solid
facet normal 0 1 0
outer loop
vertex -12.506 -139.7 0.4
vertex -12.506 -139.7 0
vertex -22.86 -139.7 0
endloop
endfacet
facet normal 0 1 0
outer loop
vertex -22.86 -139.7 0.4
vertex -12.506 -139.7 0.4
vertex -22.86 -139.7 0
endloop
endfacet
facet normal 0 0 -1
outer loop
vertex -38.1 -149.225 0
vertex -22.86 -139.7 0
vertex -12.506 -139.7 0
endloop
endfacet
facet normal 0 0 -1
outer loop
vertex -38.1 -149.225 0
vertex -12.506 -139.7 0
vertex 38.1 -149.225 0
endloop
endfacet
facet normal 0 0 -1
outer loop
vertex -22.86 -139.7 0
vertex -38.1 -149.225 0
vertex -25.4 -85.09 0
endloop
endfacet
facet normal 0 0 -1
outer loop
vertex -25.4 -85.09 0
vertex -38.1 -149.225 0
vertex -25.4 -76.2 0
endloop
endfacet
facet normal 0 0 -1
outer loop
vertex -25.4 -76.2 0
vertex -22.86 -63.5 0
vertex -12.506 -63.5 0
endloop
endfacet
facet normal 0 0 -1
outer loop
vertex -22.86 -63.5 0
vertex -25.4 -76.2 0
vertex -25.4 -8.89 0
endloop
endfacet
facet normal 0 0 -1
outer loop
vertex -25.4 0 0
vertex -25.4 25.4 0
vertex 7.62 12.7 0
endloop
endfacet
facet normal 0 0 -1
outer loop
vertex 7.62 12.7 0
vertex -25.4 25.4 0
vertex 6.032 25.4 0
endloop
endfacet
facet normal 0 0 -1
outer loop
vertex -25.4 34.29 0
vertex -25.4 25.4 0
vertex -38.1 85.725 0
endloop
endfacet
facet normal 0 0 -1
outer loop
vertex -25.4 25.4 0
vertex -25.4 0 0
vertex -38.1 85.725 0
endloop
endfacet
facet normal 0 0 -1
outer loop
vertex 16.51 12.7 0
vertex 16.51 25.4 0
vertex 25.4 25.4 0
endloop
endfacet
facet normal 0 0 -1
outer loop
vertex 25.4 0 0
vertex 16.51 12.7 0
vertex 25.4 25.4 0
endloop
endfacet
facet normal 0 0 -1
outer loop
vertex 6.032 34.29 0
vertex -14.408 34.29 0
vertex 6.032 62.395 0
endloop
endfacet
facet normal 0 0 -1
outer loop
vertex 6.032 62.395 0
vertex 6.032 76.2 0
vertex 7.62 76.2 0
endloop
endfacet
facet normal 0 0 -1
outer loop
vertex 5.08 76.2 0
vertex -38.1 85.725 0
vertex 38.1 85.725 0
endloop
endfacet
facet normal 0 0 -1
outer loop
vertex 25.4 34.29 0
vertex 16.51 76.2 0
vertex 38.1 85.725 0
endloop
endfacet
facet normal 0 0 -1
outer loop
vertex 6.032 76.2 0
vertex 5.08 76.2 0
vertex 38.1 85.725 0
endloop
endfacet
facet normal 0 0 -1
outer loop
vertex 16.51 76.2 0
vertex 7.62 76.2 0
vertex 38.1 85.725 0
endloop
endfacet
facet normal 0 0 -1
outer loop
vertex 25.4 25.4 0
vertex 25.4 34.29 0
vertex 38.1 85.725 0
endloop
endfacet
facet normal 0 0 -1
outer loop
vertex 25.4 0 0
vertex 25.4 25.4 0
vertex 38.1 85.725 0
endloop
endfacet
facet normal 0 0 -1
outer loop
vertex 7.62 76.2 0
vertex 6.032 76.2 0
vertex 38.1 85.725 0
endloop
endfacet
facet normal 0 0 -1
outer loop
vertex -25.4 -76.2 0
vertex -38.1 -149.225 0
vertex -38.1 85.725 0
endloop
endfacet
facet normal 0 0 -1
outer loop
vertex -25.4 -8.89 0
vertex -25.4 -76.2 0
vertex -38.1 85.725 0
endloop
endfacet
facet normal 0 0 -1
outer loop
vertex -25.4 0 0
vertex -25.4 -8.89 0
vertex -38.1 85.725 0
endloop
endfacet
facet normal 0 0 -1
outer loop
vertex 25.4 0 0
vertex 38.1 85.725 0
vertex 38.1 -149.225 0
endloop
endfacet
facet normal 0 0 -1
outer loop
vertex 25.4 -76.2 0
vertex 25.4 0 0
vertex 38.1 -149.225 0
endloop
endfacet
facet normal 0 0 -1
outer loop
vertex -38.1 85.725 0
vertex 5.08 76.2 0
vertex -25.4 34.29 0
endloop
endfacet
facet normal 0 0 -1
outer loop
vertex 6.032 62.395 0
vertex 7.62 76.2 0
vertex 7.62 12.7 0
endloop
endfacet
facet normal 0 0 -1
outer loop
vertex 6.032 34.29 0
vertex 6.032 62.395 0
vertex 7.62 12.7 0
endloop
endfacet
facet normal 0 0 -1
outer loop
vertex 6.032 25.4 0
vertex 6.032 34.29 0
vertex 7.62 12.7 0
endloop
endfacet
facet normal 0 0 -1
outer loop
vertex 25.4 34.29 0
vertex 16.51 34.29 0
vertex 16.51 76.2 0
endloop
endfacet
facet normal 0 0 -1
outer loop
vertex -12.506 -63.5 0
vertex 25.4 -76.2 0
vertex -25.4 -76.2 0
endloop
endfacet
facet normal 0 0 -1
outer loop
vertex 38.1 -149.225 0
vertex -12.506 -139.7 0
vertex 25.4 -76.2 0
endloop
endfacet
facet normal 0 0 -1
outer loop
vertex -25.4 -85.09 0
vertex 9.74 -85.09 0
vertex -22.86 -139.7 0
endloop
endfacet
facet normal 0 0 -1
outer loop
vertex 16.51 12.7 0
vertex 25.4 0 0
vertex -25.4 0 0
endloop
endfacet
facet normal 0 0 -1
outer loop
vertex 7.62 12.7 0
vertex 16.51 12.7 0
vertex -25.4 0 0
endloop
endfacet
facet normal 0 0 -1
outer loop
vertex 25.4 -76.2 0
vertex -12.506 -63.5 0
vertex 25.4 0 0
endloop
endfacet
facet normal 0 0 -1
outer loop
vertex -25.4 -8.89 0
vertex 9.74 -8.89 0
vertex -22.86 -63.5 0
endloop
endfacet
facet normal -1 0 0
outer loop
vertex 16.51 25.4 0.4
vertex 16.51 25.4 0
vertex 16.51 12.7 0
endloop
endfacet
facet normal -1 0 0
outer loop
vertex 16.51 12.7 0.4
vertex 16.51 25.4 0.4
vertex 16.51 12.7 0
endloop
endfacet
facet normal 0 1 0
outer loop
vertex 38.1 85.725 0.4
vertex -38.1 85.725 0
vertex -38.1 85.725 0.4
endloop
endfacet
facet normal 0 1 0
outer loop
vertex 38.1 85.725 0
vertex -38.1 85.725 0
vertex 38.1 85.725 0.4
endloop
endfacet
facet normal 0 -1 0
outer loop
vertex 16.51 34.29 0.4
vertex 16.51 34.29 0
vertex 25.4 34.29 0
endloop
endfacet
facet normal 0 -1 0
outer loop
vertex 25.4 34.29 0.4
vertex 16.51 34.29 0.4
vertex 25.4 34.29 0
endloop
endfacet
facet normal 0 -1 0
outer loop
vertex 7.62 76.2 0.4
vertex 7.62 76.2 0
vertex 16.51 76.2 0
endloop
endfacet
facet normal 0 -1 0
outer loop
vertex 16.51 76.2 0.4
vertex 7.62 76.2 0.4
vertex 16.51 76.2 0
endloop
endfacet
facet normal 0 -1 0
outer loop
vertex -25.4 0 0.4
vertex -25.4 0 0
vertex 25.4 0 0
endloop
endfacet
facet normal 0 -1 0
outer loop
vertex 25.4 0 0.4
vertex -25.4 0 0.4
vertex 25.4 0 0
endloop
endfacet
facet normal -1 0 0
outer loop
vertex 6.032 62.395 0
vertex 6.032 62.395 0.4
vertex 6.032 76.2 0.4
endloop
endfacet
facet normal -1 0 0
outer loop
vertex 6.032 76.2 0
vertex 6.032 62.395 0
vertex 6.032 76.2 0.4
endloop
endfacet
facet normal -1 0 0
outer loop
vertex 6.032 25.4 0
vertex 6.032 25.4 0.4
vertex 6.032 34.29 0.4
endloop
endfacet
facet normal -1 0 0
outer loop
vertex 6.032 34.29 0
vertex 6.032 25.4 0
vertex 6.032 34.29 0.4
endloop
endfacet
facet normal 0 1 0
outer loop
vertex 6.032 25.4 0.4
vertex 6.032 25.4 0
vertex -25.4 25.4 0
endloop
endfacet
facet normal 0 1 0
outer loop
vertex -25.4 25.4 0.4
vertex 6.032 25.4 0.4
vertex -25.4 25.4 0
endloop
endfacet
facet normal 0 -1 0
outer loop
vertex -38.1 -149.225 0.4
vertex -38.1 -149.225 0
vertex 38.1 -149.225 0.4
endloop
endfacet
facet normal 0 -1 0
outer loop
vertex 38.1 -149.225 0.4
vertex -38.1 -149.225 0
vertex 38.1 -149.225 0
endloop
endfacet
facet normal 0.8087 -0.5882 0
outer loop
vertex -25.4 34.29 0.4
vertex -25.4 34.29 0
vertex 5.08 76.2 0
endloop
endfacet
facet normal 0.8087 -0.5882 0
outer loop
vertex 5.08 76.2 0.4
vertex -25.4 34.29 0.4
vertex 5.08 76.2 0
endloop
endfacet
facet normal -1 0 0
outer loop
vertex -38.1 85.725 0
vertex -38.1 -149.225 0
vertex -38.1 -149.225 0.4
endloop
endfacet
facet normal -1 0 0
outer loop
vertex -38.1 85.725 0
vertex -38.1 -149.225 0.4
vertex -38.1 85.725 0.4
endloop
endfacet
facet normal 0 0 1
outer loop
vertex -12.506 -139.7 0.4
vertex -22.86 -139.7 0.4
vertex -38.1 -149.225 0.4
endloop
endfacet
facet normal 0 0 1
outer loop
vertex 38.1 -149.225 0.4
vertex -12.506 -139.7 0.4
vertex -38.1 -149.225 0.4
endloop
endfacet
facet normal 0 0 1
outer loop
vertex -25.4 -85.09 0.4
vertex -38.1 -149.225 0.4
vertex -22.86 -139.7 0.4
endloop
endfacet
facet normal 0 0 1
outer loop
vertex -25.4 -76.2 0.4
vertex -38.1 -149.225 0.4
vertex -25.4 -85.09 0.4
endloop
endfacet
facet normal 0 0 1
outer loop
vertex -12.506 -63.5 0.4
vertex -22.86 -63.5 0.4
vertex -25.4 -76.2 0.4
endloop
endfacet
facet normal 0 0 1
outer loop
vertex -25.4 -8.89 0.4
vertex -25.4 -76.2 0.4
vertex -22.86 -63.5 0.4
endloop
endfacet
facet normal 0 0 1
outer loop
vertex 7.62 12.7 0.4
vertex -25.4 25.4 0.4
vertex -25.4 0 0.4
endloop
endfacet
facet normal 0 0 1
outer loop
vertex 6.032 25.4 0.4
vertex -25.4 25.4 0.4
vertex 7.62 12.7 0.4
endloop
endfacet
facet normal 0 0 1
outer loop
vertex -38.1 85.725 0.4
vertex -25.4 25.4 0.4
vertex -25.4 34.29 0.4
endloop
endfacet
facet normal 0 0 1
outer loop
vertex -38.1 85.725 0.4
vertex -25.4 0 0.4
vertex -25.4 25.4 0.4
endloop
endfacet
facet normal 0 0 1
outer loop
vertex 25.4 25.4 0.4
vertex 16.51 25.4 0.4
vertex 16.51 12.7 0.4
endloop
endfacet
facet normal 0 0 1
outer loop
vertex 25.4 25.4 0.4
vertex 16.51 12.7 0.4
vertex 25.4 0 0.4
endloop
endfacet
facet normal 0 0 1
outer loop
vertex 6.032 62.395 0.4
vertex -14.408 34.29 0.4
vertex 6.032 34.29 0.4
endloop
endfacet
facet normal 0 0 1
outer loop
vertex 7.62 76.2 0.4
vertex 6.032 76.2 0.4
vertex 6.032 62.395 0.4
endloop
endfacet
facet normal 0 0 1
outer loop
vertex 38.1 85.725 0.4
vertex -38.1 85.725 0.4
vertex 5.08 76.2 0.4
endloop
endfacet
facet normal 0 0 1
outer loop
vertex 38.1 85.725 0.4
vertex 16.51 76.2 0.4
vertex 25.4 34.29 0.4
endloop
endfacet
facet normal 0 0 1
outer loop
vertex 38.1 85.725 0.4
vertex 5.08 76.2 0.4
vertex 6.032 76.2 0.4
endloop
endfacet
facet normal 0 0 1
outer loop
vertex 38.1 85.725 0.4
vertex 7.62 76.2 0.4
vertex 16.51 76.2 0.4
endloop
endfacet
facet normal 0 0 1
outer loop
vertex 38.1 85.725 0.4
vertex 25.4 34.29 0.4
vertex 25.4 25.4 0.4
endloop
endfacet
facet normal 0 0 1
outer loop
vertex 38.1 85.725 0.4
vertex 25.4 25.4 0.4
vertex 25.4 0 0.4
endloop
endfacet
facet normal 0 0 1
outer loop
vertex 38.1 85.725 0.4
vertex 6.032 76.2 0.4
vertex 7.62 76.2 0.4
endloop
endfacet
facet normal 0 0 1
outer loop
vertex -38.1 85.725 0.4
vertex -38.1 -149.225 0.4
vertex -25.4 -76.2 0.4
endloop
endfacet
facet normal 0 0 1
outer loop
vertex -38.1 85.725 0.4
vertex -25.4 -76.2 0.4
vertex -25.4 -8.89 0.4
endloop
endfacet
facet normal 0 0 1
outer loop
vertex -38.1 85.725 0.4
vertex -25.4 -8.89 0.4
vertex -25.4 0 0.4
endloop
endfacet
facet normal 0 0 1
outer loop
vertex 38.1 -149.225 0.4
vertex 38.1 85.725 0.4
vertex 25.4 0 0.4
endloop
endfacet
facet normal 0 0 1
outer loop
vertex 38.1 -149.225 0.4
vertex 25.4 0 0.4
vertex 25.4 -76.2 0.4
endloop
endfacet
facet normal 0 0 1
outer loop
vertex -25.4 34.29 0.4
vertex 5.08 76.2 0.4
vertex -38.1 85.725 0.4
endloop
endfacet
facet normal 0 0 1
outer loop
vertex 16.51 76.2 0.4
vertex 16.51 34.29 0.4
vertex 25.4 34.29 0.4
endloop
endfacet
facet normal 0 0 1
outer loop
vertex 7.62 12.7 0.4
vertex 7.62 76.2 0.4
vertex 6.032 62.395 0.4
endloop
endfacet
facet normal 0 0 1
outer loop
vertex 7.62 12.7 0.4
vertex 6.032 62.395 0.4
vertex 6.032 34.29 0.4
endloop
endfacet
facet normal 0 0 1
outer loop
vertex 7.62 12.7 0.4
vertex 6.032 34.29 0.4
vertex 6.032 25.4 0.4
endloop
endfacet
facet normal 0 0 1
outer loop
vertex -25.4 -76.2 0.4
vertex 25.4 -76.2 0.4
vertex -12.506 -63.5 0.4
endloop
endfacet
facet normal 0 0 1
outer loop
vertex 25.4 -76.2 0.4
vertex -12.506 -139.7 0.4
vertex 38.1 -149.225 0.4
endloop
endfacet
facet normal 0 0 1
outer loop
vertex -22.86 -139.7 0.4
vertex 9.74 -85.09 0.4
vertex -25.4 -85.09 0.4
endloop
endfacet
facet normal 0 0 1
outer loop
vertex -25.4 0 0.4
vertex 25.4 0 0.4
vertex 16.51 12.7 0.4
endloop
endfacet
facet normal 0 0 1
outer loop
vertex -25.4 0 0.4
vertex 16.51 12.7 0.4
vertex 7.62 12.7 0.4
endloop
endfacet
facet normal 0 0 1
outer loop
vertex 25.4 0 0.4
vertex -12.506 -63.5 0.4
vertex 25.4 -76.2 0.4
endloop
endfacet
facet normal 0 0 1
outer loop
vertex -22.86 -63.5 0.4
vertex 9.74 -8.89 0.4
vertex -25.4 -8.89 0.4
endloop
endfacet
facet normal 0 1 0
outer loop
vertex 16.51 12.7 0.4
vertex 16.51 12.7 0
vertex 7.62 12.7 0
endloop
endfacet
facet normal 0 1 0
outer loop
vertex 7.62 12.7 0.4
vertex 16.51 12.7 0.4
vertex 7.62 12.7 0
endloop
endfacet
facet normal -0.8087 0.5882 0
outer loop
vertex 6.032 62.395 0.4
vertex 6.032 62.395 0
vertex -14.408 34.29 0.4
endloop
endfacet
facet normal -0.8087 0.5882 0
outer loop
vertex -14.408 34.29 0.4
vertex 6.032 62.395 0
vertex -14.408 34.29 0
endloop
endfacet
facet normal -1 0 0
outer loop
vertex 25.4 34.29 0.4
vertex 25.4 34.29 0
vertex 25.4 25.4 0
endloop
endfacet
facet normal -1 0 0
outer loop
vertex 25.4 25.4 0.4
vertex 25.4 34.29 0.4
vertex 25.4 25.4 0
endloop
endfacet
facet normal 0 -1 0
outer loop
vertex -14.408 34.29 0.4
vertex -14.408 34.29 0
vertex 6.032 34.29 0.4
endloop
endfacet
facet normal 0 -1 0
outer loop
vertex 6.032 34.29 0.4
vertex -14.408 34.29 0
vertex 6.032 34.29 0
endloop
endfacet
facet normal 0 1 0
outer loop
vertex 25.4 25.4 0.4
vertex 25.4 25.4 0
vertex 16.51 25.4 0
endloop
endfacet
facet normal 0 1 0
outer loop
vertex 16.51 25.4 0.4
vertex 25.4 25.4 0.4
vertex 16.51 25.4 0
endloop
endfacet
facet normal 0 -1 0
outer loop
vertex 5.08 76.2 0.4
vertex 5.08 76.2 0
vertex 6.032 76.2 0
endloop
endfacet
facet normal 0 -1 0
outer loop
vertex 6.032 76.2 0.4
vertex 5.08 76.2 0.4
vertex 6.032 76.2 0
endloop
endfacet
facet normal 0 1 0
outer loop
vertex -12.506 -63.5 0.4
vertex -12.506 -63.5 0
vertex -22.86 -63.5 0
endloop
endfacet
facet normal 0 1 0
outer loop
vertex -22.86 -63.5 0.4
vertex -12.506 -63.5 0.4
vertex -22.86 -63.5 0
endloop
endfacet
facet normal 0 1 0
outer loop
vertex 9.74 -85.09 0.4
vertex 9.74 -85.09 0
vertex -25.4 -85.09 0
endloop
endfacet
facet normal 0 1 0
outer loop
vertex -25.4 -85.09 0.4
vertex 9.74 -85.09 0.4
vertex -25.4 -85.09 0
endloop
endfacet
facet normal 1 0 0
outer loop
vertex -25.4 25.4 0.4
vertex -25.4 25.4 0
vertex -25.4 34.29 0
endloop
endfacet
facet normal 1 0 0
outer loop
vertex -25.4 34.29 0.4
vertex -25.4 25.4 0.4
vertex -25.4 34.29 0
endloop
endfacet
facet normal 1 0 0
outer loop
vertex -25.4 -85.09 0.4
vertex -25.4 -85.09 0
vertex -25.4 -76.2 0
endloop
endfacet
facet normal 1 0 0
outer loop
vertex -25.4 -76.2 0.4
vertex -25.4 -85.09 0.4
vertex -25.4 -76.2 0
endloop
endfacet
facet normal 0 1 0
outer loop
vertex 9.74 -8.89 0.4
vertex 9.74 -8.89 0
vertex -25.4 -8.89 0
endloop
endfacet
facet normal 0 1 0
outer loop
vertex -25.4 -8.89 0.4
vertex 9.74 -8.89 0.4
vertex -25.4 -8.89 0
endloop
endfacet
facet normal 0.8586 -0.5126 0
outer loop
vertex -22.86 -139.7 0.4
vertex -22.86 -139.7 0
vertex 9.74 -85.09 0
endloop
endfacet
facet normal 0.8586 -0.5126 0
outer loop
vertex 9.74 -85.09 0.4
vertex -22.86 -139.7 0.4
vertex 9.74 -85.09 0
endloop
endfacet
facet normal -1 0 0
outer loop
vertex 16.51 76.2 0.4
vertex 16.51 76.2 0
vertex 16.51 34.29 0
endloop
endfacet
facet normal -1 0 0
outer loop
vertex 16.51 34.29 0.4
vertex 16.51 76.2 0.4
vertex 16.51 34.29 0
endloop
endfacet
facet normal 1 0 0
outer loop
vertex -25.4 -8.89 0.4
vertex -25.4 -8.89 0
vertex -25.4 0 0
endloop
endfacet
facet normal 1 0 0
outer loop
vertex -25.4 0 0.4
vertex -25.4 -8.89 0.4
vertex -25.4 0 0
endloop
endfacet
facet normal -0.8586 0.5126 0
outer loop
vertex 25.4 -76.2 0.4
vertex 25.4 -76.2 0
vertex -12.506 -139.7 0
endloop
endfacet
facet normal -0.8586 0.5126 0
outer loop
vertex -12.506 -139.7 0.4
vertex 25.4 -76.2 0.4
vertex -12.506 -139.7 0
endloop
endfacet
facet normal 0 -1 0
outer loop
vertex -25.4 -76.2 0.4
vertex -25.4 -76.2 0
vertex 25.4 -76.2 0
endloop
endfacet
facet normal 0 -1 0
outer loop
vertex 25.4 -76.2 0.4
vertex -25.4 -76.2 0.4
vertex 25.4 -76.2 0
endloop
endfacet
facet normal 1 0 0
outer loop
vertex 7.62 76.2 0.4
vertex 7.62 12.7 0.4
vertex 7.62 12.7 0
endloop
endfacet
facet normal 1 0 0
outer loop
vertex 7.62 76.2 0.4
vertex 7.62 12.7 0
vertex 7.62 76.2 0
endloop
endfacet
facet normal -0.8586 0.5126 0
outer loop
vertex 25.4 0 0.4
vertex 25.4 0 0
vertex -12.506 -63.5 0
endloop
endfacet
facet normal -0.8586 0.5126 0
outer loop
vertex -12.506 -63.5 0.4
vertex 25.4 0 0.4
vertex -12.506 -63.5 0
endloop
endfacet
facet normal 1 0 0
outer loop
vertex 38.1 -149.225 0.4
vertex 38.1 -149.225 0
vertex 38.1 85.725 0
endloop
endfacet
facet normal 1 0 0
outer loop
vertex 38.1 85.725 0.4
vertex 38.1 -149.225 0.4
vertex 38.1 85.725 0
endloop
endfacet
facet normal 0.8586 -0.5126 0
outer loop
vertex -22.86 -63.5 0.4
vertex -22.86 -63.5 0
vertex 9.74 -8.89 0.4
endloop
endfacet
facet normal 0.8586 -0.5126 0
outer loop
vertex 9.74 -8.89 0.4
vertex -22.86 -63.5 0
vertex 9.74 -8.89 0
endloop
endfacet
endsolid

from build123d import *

# Parameters (mm, degrees)
BOSS_EXTRUDE1_DEPTH   = 0.4
SKETCH1_W             = 76.2
SKETCH1_H             = 234.95
BOSS_EXTRUDE1_2_DEPTH = 0.4
SKETCH2_W             = 1.5875
SKETCH2_H             = 50.8
BOSS_EXTRUDE2_DEPTH   = 0.4


with BuildPart() as part:
    # Sketch1 → Boss-Extrude1 (new body)
    with BuildSketch(Plane.XY):
        Polygon((7.62, 64.577865897), (-14.407538834, 34.29), (7.62, 34.29), align=None)
    extrude(amount=BOSS_EXTRUDE1_DEPTH)



with BuildPart() as body_2:
    # Sketch1 → Boss-Extrude1 2 (new body)
    with BuildSketch(Plane.XY):
        with Locations((0, -31.75)):
            Rectangle(SKETCH1_W, SKETCH1_H)
        Polygon((16.51, 76.2), (16.51, 34.29), (25.4, 34.29), (25.4, 25.4), (16.51, 25.4), (16.51, 12.7), (7.62, 12.7), (7.62, 25.4), (-25.4, 25.4), (-25.4, 34.29), (5.08, 76.2), align=None, mode=Mode.SUBTRACT)
        Polygon((-25.4, 0), (25.4, 0), (-12.506480557, -63.5), (-22.86, -63.5), (9.739573279, -8.89), (-25.4, -8.89), align=None, mode=Mode.SUBTRACT)
        Polygon((-25.4, -76.2), (25.4, -76.2), (-12.506480557, -139.7), (-22.86, -139.7), (9.739573279, -85.09), (-25.4, -85.09), align=None, mode=Mode.SUBTRACT)
    extrude(amount=BOSS_EXTRUDE1_2_DEPTH)


with BuildPart() as part_1:
    add(part.part)

    add(body_2.part)  # Boss-Extrude2 merges body 2
    # Sketch2 → Boss-Extrude2 (add)
    with BuildSketch(Plane.XY.offset(0.4)):
        with Locations((6.82625, 50.8)):
            Rectangle(SKETCH2_W, SKETCH2_H)
    extrude(amount=-BOSS_EXTRUDE2_DEPTH)


solid = part_1.part
